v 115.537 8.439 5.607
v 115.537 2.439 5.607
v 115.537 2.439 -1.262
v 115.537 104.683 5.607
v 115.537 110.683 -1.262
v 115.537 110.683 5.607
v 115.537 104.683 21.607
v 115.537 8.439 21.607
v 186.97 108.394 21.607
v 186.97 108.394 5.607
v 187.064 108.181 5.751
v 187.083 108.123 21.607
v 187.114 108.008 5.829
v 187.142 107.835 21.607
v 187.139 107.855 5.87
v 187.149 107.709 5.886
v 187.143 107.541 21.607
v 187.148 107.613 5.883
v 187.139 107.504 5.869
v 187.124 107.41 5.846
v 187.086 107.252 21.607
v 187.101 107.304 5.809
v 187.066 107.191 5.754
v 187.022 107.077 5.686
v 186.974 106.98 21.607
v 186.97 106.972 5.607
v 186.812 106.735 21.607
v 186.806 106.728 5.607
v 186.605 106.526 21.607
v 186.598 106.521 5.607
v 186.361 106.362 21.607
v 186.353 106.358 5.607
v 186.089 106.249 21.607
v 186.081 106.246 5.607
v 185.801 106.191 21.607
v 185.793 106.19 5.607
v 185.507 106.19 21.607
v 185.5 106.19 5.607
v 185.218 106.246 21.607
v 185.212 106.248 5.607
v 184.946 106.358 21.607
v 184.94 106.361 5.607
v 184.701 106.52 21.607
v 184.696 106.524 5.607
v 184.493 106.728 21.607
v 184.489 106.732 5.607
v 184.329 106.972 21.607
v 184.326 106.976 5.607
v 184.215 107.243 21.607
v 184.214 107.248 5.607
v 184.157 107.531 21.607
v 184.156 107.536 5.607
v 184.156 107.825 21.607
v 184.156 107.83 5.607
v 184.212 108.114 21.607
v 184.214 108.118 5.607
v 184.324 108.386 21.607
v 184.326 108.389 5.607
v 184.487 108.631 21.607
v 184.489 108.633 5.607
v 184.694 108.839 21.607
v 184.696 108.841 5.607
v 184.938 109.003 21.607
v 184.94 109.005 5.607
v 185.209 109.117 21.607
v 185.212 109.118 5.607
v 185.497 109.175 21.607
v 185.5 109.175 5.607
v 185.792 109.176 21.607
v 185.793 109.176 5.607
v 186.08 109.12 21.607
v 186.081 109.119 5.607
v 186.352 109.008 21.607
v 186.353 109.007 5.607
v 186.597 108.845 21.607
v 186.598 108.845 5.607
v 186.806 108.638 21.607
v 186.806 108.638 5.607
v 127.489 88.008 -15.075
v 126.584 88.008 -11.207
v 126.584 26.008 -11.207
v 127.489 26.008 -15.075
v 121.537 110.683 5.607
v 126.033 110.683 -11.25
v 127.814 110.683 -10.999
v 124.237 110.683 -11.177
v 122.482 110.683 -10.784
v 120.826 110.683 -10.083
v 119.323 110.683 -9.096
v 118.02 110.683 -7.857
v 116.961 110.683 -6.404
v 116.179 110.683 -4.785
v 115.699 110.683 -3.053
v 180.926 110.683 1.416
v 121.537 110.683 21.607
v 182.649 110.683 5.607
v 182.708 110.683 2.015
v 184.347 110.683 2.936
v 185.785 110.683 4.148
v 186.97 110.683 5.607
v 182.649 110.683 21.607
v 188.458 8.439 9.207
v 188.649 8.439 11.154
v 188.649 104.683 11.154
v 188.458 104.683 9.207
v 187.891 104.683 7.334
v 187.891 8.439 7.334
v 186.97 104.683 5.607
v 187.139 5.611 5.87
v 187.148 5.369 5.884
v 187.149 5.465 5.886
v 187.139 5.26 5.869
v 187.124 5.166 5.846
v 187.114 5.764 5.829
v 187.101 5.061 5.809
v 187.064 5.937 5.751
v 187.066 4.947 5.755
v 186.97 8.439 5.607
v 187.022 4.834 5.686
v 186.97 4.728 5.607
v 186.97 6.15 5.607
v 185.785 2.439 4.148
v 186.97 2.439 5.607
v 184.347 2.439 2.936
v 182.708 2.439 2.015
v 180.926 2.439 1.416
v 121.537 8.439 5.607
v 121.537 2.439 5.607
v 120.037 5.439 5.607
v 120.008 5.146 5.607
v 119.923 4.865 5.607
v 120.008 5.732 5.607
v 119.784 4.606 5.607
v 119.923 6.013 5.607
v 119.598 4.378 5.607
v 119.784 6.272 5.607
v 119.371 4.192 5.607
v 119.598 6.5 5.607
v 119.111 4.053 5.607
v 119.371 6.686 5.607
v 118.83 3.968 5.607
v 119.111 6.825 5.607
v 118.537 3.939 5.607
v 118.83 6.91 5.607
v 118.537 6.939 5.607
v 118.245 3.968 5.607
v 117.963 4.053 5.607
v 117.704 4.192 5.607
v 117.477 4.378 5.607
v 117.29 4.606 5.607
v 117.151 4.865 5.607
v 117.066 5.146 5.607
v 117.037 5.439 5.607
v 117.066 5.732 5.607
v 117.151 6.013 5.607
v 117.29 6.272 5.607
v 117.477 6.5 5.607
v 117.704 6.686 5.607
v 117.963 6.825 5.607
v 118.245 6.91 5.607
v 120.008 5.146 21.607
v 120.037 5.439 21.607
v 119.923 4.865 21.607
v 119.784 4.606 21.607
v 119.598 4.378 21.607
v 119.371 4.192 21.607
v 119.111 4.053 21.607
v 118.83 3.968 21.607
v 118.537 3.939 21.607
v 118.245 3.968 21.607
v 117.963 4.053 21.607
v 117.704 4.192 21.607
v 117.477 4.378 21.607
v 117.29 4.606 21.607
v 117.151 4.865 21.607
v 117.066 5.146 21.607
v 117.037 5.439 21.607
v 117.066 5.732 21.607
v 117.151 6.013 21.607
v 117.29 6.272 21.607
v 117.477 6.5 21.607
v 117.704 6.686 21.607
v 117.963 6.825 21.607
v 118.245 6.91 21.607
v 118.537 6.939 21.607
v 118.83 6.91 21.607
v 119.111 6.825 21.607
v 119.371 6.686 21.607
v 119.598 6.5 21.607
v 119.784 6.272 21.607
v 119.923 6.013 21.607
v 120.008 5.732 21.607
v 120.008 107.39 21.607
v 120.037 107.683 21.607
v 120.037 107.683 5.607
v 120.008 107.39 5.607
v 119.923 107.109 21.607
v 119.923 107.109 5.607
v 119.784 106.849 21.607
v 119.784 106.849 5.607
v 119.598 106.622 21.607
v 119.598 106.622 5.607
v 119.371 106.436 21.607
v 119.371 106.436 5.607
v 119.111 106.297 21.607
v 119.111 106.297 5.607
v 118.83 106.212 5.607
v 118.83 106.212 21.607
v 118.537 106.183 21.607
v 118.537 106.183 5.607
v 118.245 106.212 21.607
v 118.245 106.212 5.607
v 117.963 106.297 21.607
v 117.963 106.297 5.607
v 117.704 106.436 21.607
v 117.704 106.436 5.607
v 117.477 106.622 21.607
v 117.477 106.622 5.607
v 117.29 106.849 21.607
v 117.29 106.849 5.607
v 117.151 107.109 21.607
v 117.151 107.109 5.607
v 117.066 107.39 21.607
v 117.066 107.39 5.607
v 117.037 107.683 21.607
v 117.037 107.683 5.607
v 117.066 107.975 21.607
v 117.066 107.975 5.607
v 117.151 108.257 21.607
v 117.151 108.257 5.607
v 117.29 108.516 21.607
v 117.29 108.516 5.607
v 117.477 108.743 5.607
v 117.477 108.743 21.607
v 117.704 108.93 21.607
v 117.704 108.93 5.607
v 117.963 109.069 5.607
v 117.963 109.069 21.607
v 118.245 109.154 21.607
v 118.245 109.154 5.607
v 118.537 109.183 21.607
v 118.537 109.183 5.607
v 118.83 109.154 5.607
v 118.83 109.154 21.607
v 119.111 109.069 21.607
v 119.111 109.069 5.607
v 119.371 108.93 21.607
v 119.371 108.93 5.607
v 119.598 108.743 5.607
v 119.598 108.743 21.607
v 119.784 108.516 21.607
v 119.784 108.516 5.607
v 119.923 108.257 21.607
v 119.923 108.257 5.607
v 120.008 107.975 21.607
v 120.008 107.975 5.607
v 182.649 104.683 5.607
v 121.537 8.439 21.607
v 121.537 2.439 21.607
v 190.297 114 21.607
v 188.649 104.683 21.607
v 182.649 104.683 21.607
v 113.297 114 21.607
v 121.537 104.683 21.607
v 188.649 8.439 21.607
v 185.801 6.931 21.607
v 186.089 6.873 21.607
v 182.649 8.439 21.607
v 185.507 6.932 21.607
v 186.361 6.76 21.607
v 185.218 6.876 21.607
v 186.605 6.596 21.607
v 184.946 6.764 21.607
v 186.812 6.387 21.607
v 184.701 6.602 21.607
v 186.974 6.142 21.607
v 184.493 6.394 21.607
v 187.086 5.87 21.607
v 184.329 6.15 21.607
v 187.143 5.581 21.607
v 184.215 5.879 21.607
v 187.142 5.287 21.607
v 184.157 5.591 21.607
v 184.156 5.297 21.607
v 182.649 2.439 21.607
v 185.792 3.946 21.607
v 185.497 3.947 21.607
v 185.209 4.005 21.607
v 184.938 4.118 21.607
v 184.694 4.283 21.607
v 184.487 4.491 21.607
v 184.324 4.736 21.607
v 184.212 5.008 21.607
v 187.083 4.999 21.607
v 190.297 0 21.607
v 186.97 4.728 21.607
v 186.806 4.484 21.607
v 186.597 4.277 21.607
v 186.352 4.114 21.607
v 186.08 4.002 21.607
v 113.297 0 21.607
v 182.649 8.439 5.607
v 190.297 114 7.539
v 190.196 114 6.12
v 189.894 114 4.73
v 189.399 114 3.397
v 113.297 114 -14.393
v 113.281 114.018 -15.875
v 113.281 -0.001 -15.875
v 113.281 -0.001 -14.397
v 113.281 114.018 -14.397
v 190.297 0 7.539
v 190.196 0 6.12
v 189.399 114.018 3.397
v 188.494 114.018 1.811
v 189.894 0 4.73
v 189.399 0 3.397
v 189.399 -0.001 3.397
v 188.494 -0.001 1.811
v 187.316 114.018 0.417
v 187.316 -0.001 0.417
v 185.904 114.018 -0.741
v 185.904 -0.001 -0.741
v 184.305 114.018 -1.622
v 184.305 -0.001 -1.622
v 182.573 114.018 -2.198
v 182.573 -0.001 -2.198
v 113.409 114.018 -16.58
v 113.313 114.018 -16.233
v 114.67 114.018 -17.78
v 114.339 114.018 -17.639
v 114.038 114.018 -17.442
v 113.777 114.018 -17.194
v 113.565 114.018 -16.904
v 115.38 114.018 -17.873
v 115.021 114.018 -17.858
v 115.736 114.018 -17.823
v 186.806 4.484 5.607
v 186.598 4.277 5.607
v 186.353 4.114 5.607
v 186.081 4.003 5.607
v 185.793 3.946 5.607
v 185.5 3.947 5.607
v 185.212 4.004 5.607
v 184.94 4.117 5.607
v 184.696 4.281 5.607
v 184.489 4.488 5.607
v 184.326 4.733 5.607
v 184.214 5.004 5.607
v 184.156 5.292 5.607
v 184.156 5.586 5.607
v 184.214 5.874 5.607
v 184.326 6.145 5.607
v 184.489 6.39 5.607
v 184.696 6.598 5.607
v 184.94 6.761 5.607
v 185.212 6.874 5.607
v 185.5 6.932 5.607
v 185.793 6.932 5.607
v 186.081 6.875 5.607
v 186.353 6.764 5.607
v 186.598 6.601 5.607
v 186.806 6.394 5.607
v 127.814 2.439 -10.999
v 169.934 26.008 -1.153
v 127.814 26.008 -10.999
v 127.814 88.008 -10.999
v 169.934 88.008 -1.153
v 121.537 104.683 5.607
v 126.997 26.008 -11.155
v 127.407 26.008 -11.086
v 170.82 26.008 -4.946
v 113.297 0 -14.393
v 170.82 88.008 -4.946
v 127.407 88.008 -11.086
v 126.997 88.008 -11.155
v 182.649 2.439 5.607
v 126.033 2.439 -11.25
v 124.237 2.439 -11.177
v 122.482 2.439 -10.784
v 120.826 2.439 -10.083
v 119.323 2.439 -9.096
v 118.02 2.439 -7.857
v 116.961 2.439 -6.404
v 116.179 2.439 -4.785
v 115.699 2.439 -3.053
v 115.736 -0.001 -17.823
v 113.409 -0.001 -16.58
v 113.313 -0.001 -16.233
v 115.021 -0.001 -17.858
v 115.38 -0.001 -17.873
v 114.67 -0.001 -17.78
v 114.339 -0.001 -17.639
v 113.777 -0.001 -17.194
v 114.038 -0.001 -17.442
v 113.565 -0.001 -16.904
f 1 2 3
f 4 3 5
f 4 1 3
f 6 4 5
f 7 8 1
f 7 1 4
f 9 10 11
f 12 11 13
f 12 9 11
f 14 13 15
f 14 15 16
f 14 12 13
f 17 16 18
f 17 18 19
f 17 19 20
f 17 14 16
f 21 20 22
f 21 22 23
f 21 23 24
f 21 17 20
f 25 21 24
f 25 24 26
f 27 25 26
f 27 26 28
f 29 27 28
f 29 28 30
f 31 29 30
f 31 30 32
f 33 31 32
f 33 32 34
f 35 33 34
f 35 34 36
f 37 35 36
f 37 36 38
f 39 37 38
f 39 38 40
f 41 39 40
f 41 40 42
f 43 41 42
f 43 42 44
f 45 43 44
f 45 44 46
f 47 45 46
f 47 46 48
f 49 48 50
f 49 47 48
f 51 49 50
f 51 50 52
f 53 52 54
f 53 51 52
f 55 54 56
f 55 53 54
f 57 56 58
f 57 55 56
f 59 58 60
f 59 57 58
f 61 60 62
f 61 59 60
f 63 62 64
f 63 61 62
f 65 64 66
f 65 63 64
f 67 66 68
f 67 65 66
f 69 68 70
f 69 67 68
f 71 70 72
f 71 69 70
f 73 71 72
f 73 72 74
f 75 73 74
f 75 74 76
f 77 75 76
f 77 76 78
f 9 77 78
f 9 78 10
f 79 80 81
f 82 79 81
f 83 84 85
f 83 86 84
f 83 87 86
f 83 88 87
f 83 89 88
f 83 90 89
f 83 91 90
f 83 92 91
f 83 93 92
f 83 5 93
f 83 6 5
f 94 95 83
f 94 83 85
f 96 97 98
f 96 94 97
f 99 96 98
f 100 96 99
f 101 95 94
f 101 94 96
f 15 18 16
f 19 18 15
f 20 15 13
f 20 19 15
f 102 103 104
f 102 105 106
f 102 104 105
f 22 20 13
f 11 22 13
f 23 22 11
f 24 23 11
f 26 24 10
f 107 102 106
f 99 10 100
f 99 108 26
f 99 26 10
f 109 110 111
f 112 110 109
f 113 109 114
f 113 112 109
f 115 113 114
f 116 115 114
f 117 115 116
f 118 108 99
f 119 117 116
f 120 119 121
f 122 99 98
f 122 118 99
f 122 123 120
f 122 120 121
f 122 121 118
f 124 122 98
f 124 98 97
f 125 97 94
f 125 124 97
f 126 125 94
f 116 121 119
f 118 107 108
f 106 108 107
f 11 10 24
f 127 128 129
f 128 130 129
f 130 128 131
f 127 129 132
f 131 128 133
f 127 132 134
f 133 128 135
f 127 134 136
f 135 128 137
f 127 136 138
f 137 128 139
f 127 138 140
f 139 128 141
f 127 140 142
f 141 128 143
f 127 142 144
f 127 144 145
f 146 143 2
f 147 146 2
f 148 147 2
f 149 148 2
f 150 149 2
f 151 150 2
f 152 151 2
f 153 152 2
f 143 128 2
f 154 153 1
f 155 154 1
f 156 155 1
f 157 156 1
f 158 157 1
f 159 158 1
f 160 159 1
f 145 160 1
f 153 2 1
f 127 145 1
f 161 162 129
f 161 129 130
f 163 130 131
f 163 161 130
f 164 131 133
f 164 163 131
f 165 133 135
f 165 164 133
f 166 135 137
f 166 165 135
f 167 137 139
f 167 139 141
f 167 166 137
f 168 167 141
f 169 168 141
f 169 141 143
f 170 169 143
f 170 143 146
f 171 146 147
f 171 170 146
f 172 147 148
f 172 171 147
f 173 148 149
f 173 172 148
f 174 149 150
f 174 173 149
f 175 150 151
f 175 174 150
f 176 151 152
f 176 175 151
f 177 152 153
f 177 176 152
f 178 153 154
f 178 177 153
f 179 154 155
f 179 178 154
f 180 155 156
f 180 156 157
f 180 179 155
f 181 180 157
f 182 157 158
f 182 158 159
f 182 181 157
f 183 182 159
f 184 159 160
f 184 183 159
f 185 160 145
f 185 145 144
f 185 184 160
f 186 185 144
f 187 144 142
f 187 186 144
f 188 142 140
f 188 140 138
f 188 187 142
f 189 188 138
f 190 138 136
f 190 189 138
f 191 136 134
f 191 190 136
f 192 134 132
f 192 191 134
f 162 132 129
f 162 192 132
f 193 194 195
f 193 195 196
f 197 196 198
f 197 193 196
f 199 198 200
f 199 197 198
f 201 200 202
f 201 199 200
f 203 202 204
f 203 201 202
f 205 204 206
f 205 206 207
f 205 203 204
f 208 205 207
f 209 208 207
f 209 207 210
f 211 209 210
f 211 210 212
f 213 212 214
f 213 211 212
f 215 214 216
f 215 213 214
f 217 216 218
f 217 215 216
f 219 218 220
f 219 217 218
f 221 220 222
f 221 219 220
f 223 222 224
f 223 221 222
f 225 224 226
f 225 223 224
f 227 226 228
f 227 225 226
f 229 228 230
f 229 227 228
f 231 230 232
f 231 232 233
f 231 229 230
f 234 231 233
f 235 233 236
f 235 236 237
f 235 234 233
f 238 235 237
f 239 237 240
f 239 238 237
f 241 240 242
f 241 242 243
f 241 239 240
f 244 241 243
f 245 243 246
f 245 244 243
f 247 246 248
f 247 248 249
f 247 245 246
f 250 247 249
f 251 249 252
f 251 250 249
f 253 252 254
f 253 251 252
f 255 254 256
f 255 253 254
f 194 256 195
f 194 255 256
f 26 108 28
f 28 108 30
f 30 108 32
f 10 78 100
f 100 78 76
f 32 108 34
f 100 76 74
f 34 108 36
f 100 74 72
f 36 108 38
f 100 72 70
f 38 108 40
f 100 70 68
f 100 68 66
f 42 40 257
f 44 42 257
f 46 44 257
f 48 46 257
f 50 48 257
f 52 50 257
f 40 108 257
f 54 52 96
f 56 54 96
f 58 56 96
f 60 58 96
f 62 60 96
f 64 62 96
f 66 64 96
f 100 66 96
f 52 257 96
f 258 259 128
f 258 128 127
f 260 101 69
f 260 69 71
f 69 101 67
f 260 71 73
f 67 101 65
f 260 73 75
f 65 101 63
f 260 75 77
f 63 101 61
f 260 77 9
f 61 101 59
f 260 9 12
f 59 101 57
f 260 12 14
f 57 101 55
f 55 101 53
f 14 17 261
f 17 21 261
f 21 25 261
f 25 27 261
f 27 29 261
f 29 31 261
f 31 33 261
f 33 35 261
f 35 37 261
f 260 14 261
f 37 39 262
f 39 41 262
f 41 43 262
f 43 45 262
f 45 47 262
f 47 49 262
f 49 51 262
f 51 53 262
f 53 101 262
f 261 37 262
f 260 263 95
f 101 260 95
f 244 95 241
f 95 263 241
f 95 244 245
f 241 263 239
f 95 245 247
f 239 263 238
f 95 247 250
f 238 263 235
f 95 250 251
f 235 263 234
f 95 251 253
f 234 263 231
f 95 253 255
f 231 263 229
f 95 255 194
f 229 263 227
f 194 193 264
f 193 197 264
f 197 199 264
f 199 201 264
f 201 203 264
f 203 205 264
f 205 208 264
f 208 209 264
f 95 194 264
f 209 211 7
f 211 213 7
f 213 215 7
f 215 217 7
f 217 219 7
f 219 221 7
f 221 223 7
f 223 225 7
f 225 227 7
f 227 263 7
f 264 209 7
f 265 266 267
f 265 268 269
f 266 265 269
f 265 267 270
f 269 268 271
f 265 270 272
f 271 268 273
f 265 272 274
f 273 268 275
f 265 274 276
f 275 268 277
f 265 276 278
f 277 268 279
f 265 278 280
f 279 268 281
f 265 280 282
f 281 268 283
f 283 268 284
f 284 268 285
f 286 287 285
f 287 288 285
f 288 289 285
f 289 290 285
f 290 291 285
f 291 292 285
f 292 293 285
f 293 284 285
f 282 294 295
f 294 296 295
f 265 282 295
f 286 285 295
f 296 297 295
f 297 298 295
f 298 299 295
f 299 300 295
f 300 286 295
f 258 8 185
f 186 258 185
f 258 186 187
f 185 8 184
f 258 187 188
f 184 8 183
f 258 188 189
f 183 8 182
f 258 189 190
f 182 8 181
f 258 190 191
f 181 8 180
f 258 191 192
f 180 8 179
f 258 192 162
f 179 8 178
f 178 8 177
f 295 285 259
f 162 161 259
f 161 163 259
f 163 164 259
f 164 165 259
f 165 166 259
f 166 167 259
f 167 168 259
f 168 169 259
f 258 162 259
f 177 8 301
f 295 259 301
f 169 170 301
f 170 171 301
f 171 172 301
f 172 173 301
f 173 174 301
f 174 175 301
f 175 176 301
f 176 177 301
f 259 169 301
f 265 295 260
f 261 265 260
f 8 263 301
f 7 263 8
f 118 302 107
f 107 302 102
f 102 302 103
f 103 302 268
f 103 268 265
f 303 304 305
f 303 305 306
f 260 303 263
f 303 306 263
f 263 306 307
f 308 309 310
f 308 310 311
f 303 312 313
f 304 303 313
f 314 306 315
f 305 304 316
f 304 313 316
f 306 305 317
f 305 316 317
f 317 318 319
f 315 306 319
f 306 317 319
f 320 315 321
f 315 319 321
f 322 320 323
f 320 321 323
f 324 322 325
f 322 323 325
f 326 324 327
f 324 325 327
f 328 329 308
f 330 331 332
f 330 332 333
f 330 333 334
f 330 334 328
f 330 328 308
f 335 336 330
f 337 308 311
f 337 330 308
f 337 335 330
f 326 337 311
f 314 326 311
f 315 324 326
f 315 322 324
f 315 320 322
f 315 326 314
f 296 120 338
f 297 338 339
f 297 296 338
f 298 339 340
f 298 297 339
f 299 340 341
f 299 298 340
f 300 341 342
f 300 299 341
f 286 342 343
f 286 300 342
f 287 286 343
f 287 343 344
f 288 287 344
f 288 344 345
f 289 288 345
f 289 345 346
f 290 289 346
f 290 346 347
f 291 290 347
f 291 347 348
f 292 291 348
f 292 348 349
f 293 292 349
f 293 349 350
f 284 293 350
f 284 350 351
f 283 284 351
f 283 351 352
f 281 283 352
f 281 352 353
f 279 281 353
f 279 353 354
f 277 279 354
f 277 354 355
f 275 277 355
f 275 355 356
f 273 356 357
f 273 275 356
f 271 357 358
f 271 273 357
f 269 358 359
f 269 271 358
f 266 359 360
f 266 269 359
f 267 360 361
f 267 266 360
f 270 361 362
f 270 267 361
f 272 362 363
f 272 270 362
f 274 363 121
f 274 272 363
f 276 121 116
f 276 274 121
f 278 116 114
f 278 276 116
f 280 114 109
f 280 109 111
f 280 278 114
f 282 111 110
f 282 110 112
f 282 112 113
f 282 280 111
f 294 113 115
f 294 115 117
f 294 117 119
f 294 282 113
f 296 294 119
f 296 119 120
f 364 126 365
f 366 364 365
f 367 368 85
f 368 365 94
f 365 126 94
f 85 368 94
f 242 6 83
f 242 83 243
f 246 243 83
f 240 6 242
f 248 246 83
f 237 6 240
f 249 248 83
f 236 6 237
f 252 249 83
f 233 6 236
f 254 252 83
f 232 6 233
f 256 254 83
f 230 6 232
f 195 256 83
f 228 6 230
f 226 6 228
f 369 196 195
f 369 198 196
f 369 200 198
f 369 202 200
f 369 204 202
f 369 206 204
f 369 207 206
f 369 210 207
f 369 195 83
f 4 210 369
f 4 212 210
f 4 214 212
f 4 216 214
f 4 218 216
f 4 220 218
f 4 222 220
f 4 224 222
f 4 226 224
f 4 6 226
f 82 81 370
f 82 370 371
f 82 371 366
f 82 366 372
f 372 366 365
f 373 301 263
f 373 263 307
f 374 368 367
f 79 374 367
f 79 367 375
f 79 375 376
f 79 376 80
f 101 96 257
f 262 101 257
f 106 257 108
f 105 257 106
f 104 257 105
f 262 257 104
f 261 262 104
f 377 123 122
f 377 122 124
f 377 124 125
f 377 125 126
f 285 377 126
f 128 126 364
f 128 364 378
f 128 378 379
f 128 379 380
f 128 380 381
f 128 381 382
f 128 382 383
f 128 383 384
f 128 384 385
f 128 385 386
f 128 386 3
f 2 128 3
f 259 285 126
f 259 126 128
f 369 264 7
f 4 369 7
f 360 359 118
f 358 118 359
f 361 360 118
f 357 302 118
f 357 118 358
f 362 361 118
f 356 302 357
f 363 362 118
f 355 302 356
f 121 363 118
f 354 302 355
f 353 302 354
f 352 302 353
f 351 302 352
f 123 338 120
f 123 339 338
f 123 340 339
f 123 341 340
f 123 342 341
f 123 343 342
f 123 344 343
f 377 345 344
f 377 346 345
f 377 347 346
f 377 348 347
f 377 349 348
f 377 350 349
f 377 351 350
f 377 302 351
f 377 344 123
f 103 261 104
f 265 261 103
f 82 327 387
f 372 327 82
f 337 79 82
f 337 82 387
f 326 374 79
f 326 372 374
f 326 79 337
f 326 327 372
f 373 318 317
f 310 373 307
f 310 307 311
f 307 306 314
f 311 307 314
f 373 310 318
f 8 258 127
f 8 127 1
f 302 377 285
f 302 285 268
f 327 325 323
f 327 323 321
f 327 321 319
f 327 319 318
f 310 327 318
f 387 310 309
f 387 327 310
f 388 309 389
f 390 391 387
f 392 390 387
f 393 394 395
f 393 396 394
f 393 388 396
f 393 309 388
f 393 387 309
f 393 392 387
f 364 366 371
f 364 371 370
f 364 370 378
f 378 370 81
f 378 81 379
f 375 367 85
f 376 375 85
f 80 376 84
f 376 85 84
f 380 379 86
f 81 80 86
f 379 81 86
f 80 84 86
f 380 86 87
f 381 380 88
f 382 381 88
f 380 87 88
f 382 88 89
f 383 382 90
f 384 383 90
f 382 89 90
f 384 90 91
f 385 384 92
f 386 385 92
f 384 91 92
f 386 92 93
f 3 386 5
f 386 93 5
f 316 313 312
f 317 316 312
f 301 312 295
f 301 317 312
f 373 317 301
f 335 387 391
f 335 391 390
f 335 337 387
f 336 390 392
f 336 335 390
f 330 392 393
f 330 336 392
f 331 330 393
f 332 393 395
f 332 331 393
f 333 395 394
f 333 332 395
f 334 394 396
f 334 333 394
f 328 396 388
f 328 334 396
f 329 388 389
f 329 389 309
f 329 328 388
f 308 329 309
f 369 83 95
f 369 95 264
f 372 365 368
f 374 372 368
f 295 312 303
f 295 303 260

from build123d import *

# Parameters (mm, degrees)
RESSALTO_EXTRUS_O1_DEPTH   = 114
CORTE_EXTRUS_O1_DEPTH      = 59
RESSALTO_EXTRUS_O3_DEPTH   = 4
FILETE1_R                  = 10
FILETE2_R                  = 10
FILETE3_R                  = 10
FILETE4_R                  = 2
CORTE_EXTRUS_O2_DEPTH      = 19
CORTE_EXTRUS_O2_DEPTH_BACK = 10
F_3DSKETCH5_R              = 1.5
RESSALTO_EXTRUS_O6_DEPTH   = 16


with BuildPart() as part:
    # Esboço1 → Ressalto-extrusão1 (new body)
    with BuildSketch(Plane(origin=(0, 0, 0), x_dir=(1, 0, 0), z_dir=(0, 1, 0))):
        Polygon((113.296704203, 18.392857143), (190.296704203, 0.392857143), (190.296704203, -21.607142857), (113.296704203, -21.607142857), align=None)
    extrude(amount=RESSALTO_EXTRUS_O1_DEPTH)

    # 3DSketch1 → Corte-extrusão1 (cut)
    with BuildSketch(Plane(origin=(115.537266243, 110.682804253, 21.607142857), x_dir=(0.5597225204223067, -0.8286800951706879, 0), z_dir=(0, 0, -1))):
        Polygon((0, 0), (40.922432447, -60.586458429), (130.621864407, 0), (89.699431959, 60.586458429), align=None)
    extrude(amount=CORTE_EXTRUS_O1_DEPTH, mode=Mode.SUBTRACT)

    # 3DSketch3 → Ressalto-extrusão3 (add, along a direction that is not the sketch's normal)
    with BuildSketch(Plane(origin=(113.280710176, 114.017648872, -18.396596006), x_dir=(0.5549294721149596, -0.8217207699541985, 0.12972377270219831), z_dir=(-0.22762936703818706, 0, 0.9737478478855778))):
        Polygon((0, 0), (45.064591164, 64.978311237), (138.756352747, 0), (93.691761582, -64.978311237), align=None)
    extrude(amount=RESSALTO_EXTRUS_O3_DEPTH, dir=(0, 0, 1))

    # Filete1
    # the kernel refuses this fillet: 10 mm, written as the material it takes off along each edge
    with BuildSketch(Plane(origin=(190.296704203, -19.829841849, -0.392857143), x_dir=(-0.973747847885578, 0, -0.22762936703818593), z_dir=(0, 1, 0))) as filete1_piece_1:
        with BuildLine():
            CenterArc((FILETE1_R * 0.793193673946, FILETE1_R), FILETE1_R, 193.15754274, 76.84245726)
            Line((-FILETE1_R * 0.180554173939, FILETE1_R * 0.772370632962), (0, 0))
            Line((0, 0), (FILETE1_R * 0.793193673946, 0))
        make_face()
    extrude(amount=153.659683697, mode=Mode.SUBTRACT)

    # Filete2
    filete2_edges = [part.edges().sort_by_distance(p)[0] for p in [
        (188.649265411, 56.560934739, 3.222027295),
    ]]
    fillet(filete2_edges, radius=FILETE2_R)

    # Filete3
    filete3_edges = [part.edges().sort_by_distance(p)[0] for p in [
        (115.537266243, 56.560934739, -13.869089393),
    ]]
    fillet(filete3_edges, radius=FILETE3_R)

    # Filete4
    filete4_edges = [part.edges().sort_by_distance(p)[0] for p in [
        (113.280710176, 57.008160365, -18.396596006),
    ]]
    fillet(filete4_edges, radius=FILETE4_R)

    # 3DSketch4 → Corte-extrusão2 (cut, two sides: drawn at the far end of the back side and taken through both)
    with BuildSketch(Plane(origin=(170.820373008, 88.008160365, -4.945765734), x_dir=(-0.5677884026874886, -0.8124033121057346, -0.13272975647240007), z_dir=(0.22762936703818715, 0, -0.9737478478855778)).offset(-CORTE_EXTRUS_O2_DEPTH_BACK)):
        Polygon((0, 0), (25.94776869, 36.151947389), (76.316774041, 0), (50.369005351, -36.151947389), align=None)
    extrude(amount=CORTE_EXTRUS_O2_DEPTH + CORTE_EXTRUS_O2_DEPTH_BACK, mode=Mode.SUBTRACT)

    # 3DSketch5 → Ressalto-extrusão6 (add)
    # profile 1 of 4: a face of its own
    with BuildSketch(Plane(origin=(115.537266243, 110.682804253, 21.607142857), x_dir=(0.5597225204223067, -0.8286800951706879, 0), z_dir=(0, 0, -1))):
        Polygon((0, 0), (3.358335123, -4.972080571), (8.330415694, -1.613745448), (4.972080571, 3.358335123), align=None)
        with Locations(Location((4.165207847, -0.806872724, 0), (0, 0, 304.036610354))):
            Circle(F_3DSKETCH5_R, mode=Mode.SUBTRACT)
    # profile 2 of 4: a face of its own
    with BuildSketch(Plane(origin=(115.537266243, 110.682804253, 21.607142857), x_dir=(0.5597225204223067, -0.8286800951706879, 0), z_dir=(0, 0, -1))):
        Polygon((40.922432447, -60.586458429), (37.564097325, -55.614377858), (42.536177896, -52.256042735), (45.894513018, -57.228123306), align=None)
        with Locations(Location((41.729305172, -56.421250582, 0), (0, 0, 275.729153182))):
            Circle(F_3DSKETCH5_R, mode=Mode.SUBTRACT)
    # profile 3 of 4: a face of its own
    with BuildSketch(Plane(origin=(115.537266243, 110.682804253, 21.607142857), x_dir=(0.5597225204223067, -0.8286800951706879, 0), z_dir=(0, 0, -1))):
        Polygon((130.621864407, 0), (127.263529284, 4.972080571), (122.291448713, 1.613745448), (125.649783836, -3.358335123), align=None)
        with Locations(Location((126.45665656, 0.806872724, 0), (0, 0, 332.344067525))):
            Circle(F_3DSKETCH5_R, mode=Mode.SUBTRACT)
    # profile 4 of 4: a face of its own
    with BuildSketch(Plane(origin=(115.537266243, 110.682804253, 21.607142857), x_dir=(0.5597225204223067, -0.8286800951706879, 0), z_dir=(0, 0, -1))):
        Polygon((89.699431959, 60.586458429), (93.057767082, 55.614377858), (88.085686511, 52.256042735), (84.727351388, 57.228123306), align=None)
        with Locations(Location((88.892559235, 56.421250582, 0), (0, 0, 304.036610354))):
            Circle(F_3DSKETCH5_R, mode=Mode.SUBTRACT)
    extrude(amount=RESSALTO_EXTRUS_O6_DEPTH)


solid = part.part
